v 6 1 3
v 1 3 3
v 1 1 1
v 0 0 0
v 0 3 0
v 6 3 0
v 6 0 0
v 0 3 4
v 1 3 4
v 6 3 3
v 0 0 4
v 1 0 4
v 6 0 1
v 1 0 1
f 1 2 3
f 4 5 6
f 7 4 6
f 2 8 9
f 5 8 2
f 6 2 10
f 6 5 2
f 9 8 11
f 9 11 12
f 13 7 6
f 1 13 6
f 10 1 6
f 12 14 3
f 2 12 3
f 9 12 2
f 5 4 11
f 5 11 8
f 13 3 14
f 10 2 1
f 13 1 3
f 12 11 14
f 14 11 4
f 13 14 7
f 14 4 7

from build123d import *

# Parameters (mm, degrees)
F0_W      = 6
F0_H      = 3
F1_DEPTH  = 4
F2_W      = 5
F2_H      = 3
F3_DEPTH  = 1
F4_W      = 5
F4_H      = 1
F5_DEPTH  = 2
F10_DEPTH = 1
F11_W     = 3
F11_H     = 3
F12_DEPTH = 25
F13_DEPTH = 1
F14_W     = 3
F14_H     = 3
F15_DEPTH = 1
F16_W     = 0.5303061543
F16_H     = 0.5303061543
F17_DEPTH = 1.4


with BuildPart() as f1:
    # F0 (on Top) → F1 (new body)
    with BuildSketch(Plane.XY):
        with Locations((3, 1.5)):
            Rectangle(F0_W, F0_H)
    extrude(amount=F1_DEPTH)

    # F2 (on face) → F3 (cut)
    with BuildSketch(Plane.XY.offset(4)):
        with Locations((3.5, 1.5)):
            Rectangle(F2_W, F2_H)
    extrude(amount=-F3_DEPTH, mode=Mode.SUBTRACT)

    # F4 (on face) → F5 (cut)
    with BuildSketch(Plane.XY.offset(3)):
        with Locations((3.5, 0.5)):
            Rectangle(F4_W, F4_H)
    extrude(amount=-F5_DEPTH, mode=Mode.SUBTRACT)

    # F9 (on 3pt) → F10 (join)
    with BuildSketch(Plane(origin=(0.1085271318, 0.5426356589, -0.2713178295), x_dir=(-0.9843740387, 0.1574998462, -0.0787499231), z_dir=(0.1760901813, 0.8804509063, -0.4402254532))):
        Polygon((-5.9849941553, 0.894427191), (-0.9056241156, 1.3416407865), (-5.9849941553, 3.1304951685), align=None)
    extrude(amount=F10_DEPTH)

    # F11 (on face) → F12 (cut)
    with BuildSketch(Plane.YZ.offset(6)):
        with Locations((1.5, 1.5)):
            Rectangle(F11_W, F11_H)
    extrude(amount=F12_DEPTH, mode=Mode.SUBTRACT)

    # F7 (on 3pt) → F13 (cut)
    with BuildSketch(Plane(origin=(0.0740740741, 0.1851851852, -0.1851851852), x_dir=(0.9622504486, -0.1924500897, 0.1924500897), z_dir=(-0.272165527, -0.6804138174, 0.6804138174))):
        Polygon((6.1584028714, 2.8284271247), (0.9622504486, 4.2426406871), (0.9622504486, 1.4142135624), align=None)
    extrude(amount=F13_DEPTH, mode=Mode.SUBTRACT)

    # F14 (on face) → F15 (join)
    with BuildSketch(Plane.YZ.offset(1)):
        with Locations((1.5, 2.5)):
            Rectangle(F14_W, F14_H)
    extrude(amount=-F15_DEPTH)

    # F16 (on face) → F17 (cut)
    with BuildSketch(Plane.YZ.offset(1)):
        with Locations((1.2651530772, 2.7348469228)):
            Rectangle(F16_W, F16_H)
    extrude(amount=F17_DEPTH, mode=Mode.SUBTRACT)


solid = f1.part
